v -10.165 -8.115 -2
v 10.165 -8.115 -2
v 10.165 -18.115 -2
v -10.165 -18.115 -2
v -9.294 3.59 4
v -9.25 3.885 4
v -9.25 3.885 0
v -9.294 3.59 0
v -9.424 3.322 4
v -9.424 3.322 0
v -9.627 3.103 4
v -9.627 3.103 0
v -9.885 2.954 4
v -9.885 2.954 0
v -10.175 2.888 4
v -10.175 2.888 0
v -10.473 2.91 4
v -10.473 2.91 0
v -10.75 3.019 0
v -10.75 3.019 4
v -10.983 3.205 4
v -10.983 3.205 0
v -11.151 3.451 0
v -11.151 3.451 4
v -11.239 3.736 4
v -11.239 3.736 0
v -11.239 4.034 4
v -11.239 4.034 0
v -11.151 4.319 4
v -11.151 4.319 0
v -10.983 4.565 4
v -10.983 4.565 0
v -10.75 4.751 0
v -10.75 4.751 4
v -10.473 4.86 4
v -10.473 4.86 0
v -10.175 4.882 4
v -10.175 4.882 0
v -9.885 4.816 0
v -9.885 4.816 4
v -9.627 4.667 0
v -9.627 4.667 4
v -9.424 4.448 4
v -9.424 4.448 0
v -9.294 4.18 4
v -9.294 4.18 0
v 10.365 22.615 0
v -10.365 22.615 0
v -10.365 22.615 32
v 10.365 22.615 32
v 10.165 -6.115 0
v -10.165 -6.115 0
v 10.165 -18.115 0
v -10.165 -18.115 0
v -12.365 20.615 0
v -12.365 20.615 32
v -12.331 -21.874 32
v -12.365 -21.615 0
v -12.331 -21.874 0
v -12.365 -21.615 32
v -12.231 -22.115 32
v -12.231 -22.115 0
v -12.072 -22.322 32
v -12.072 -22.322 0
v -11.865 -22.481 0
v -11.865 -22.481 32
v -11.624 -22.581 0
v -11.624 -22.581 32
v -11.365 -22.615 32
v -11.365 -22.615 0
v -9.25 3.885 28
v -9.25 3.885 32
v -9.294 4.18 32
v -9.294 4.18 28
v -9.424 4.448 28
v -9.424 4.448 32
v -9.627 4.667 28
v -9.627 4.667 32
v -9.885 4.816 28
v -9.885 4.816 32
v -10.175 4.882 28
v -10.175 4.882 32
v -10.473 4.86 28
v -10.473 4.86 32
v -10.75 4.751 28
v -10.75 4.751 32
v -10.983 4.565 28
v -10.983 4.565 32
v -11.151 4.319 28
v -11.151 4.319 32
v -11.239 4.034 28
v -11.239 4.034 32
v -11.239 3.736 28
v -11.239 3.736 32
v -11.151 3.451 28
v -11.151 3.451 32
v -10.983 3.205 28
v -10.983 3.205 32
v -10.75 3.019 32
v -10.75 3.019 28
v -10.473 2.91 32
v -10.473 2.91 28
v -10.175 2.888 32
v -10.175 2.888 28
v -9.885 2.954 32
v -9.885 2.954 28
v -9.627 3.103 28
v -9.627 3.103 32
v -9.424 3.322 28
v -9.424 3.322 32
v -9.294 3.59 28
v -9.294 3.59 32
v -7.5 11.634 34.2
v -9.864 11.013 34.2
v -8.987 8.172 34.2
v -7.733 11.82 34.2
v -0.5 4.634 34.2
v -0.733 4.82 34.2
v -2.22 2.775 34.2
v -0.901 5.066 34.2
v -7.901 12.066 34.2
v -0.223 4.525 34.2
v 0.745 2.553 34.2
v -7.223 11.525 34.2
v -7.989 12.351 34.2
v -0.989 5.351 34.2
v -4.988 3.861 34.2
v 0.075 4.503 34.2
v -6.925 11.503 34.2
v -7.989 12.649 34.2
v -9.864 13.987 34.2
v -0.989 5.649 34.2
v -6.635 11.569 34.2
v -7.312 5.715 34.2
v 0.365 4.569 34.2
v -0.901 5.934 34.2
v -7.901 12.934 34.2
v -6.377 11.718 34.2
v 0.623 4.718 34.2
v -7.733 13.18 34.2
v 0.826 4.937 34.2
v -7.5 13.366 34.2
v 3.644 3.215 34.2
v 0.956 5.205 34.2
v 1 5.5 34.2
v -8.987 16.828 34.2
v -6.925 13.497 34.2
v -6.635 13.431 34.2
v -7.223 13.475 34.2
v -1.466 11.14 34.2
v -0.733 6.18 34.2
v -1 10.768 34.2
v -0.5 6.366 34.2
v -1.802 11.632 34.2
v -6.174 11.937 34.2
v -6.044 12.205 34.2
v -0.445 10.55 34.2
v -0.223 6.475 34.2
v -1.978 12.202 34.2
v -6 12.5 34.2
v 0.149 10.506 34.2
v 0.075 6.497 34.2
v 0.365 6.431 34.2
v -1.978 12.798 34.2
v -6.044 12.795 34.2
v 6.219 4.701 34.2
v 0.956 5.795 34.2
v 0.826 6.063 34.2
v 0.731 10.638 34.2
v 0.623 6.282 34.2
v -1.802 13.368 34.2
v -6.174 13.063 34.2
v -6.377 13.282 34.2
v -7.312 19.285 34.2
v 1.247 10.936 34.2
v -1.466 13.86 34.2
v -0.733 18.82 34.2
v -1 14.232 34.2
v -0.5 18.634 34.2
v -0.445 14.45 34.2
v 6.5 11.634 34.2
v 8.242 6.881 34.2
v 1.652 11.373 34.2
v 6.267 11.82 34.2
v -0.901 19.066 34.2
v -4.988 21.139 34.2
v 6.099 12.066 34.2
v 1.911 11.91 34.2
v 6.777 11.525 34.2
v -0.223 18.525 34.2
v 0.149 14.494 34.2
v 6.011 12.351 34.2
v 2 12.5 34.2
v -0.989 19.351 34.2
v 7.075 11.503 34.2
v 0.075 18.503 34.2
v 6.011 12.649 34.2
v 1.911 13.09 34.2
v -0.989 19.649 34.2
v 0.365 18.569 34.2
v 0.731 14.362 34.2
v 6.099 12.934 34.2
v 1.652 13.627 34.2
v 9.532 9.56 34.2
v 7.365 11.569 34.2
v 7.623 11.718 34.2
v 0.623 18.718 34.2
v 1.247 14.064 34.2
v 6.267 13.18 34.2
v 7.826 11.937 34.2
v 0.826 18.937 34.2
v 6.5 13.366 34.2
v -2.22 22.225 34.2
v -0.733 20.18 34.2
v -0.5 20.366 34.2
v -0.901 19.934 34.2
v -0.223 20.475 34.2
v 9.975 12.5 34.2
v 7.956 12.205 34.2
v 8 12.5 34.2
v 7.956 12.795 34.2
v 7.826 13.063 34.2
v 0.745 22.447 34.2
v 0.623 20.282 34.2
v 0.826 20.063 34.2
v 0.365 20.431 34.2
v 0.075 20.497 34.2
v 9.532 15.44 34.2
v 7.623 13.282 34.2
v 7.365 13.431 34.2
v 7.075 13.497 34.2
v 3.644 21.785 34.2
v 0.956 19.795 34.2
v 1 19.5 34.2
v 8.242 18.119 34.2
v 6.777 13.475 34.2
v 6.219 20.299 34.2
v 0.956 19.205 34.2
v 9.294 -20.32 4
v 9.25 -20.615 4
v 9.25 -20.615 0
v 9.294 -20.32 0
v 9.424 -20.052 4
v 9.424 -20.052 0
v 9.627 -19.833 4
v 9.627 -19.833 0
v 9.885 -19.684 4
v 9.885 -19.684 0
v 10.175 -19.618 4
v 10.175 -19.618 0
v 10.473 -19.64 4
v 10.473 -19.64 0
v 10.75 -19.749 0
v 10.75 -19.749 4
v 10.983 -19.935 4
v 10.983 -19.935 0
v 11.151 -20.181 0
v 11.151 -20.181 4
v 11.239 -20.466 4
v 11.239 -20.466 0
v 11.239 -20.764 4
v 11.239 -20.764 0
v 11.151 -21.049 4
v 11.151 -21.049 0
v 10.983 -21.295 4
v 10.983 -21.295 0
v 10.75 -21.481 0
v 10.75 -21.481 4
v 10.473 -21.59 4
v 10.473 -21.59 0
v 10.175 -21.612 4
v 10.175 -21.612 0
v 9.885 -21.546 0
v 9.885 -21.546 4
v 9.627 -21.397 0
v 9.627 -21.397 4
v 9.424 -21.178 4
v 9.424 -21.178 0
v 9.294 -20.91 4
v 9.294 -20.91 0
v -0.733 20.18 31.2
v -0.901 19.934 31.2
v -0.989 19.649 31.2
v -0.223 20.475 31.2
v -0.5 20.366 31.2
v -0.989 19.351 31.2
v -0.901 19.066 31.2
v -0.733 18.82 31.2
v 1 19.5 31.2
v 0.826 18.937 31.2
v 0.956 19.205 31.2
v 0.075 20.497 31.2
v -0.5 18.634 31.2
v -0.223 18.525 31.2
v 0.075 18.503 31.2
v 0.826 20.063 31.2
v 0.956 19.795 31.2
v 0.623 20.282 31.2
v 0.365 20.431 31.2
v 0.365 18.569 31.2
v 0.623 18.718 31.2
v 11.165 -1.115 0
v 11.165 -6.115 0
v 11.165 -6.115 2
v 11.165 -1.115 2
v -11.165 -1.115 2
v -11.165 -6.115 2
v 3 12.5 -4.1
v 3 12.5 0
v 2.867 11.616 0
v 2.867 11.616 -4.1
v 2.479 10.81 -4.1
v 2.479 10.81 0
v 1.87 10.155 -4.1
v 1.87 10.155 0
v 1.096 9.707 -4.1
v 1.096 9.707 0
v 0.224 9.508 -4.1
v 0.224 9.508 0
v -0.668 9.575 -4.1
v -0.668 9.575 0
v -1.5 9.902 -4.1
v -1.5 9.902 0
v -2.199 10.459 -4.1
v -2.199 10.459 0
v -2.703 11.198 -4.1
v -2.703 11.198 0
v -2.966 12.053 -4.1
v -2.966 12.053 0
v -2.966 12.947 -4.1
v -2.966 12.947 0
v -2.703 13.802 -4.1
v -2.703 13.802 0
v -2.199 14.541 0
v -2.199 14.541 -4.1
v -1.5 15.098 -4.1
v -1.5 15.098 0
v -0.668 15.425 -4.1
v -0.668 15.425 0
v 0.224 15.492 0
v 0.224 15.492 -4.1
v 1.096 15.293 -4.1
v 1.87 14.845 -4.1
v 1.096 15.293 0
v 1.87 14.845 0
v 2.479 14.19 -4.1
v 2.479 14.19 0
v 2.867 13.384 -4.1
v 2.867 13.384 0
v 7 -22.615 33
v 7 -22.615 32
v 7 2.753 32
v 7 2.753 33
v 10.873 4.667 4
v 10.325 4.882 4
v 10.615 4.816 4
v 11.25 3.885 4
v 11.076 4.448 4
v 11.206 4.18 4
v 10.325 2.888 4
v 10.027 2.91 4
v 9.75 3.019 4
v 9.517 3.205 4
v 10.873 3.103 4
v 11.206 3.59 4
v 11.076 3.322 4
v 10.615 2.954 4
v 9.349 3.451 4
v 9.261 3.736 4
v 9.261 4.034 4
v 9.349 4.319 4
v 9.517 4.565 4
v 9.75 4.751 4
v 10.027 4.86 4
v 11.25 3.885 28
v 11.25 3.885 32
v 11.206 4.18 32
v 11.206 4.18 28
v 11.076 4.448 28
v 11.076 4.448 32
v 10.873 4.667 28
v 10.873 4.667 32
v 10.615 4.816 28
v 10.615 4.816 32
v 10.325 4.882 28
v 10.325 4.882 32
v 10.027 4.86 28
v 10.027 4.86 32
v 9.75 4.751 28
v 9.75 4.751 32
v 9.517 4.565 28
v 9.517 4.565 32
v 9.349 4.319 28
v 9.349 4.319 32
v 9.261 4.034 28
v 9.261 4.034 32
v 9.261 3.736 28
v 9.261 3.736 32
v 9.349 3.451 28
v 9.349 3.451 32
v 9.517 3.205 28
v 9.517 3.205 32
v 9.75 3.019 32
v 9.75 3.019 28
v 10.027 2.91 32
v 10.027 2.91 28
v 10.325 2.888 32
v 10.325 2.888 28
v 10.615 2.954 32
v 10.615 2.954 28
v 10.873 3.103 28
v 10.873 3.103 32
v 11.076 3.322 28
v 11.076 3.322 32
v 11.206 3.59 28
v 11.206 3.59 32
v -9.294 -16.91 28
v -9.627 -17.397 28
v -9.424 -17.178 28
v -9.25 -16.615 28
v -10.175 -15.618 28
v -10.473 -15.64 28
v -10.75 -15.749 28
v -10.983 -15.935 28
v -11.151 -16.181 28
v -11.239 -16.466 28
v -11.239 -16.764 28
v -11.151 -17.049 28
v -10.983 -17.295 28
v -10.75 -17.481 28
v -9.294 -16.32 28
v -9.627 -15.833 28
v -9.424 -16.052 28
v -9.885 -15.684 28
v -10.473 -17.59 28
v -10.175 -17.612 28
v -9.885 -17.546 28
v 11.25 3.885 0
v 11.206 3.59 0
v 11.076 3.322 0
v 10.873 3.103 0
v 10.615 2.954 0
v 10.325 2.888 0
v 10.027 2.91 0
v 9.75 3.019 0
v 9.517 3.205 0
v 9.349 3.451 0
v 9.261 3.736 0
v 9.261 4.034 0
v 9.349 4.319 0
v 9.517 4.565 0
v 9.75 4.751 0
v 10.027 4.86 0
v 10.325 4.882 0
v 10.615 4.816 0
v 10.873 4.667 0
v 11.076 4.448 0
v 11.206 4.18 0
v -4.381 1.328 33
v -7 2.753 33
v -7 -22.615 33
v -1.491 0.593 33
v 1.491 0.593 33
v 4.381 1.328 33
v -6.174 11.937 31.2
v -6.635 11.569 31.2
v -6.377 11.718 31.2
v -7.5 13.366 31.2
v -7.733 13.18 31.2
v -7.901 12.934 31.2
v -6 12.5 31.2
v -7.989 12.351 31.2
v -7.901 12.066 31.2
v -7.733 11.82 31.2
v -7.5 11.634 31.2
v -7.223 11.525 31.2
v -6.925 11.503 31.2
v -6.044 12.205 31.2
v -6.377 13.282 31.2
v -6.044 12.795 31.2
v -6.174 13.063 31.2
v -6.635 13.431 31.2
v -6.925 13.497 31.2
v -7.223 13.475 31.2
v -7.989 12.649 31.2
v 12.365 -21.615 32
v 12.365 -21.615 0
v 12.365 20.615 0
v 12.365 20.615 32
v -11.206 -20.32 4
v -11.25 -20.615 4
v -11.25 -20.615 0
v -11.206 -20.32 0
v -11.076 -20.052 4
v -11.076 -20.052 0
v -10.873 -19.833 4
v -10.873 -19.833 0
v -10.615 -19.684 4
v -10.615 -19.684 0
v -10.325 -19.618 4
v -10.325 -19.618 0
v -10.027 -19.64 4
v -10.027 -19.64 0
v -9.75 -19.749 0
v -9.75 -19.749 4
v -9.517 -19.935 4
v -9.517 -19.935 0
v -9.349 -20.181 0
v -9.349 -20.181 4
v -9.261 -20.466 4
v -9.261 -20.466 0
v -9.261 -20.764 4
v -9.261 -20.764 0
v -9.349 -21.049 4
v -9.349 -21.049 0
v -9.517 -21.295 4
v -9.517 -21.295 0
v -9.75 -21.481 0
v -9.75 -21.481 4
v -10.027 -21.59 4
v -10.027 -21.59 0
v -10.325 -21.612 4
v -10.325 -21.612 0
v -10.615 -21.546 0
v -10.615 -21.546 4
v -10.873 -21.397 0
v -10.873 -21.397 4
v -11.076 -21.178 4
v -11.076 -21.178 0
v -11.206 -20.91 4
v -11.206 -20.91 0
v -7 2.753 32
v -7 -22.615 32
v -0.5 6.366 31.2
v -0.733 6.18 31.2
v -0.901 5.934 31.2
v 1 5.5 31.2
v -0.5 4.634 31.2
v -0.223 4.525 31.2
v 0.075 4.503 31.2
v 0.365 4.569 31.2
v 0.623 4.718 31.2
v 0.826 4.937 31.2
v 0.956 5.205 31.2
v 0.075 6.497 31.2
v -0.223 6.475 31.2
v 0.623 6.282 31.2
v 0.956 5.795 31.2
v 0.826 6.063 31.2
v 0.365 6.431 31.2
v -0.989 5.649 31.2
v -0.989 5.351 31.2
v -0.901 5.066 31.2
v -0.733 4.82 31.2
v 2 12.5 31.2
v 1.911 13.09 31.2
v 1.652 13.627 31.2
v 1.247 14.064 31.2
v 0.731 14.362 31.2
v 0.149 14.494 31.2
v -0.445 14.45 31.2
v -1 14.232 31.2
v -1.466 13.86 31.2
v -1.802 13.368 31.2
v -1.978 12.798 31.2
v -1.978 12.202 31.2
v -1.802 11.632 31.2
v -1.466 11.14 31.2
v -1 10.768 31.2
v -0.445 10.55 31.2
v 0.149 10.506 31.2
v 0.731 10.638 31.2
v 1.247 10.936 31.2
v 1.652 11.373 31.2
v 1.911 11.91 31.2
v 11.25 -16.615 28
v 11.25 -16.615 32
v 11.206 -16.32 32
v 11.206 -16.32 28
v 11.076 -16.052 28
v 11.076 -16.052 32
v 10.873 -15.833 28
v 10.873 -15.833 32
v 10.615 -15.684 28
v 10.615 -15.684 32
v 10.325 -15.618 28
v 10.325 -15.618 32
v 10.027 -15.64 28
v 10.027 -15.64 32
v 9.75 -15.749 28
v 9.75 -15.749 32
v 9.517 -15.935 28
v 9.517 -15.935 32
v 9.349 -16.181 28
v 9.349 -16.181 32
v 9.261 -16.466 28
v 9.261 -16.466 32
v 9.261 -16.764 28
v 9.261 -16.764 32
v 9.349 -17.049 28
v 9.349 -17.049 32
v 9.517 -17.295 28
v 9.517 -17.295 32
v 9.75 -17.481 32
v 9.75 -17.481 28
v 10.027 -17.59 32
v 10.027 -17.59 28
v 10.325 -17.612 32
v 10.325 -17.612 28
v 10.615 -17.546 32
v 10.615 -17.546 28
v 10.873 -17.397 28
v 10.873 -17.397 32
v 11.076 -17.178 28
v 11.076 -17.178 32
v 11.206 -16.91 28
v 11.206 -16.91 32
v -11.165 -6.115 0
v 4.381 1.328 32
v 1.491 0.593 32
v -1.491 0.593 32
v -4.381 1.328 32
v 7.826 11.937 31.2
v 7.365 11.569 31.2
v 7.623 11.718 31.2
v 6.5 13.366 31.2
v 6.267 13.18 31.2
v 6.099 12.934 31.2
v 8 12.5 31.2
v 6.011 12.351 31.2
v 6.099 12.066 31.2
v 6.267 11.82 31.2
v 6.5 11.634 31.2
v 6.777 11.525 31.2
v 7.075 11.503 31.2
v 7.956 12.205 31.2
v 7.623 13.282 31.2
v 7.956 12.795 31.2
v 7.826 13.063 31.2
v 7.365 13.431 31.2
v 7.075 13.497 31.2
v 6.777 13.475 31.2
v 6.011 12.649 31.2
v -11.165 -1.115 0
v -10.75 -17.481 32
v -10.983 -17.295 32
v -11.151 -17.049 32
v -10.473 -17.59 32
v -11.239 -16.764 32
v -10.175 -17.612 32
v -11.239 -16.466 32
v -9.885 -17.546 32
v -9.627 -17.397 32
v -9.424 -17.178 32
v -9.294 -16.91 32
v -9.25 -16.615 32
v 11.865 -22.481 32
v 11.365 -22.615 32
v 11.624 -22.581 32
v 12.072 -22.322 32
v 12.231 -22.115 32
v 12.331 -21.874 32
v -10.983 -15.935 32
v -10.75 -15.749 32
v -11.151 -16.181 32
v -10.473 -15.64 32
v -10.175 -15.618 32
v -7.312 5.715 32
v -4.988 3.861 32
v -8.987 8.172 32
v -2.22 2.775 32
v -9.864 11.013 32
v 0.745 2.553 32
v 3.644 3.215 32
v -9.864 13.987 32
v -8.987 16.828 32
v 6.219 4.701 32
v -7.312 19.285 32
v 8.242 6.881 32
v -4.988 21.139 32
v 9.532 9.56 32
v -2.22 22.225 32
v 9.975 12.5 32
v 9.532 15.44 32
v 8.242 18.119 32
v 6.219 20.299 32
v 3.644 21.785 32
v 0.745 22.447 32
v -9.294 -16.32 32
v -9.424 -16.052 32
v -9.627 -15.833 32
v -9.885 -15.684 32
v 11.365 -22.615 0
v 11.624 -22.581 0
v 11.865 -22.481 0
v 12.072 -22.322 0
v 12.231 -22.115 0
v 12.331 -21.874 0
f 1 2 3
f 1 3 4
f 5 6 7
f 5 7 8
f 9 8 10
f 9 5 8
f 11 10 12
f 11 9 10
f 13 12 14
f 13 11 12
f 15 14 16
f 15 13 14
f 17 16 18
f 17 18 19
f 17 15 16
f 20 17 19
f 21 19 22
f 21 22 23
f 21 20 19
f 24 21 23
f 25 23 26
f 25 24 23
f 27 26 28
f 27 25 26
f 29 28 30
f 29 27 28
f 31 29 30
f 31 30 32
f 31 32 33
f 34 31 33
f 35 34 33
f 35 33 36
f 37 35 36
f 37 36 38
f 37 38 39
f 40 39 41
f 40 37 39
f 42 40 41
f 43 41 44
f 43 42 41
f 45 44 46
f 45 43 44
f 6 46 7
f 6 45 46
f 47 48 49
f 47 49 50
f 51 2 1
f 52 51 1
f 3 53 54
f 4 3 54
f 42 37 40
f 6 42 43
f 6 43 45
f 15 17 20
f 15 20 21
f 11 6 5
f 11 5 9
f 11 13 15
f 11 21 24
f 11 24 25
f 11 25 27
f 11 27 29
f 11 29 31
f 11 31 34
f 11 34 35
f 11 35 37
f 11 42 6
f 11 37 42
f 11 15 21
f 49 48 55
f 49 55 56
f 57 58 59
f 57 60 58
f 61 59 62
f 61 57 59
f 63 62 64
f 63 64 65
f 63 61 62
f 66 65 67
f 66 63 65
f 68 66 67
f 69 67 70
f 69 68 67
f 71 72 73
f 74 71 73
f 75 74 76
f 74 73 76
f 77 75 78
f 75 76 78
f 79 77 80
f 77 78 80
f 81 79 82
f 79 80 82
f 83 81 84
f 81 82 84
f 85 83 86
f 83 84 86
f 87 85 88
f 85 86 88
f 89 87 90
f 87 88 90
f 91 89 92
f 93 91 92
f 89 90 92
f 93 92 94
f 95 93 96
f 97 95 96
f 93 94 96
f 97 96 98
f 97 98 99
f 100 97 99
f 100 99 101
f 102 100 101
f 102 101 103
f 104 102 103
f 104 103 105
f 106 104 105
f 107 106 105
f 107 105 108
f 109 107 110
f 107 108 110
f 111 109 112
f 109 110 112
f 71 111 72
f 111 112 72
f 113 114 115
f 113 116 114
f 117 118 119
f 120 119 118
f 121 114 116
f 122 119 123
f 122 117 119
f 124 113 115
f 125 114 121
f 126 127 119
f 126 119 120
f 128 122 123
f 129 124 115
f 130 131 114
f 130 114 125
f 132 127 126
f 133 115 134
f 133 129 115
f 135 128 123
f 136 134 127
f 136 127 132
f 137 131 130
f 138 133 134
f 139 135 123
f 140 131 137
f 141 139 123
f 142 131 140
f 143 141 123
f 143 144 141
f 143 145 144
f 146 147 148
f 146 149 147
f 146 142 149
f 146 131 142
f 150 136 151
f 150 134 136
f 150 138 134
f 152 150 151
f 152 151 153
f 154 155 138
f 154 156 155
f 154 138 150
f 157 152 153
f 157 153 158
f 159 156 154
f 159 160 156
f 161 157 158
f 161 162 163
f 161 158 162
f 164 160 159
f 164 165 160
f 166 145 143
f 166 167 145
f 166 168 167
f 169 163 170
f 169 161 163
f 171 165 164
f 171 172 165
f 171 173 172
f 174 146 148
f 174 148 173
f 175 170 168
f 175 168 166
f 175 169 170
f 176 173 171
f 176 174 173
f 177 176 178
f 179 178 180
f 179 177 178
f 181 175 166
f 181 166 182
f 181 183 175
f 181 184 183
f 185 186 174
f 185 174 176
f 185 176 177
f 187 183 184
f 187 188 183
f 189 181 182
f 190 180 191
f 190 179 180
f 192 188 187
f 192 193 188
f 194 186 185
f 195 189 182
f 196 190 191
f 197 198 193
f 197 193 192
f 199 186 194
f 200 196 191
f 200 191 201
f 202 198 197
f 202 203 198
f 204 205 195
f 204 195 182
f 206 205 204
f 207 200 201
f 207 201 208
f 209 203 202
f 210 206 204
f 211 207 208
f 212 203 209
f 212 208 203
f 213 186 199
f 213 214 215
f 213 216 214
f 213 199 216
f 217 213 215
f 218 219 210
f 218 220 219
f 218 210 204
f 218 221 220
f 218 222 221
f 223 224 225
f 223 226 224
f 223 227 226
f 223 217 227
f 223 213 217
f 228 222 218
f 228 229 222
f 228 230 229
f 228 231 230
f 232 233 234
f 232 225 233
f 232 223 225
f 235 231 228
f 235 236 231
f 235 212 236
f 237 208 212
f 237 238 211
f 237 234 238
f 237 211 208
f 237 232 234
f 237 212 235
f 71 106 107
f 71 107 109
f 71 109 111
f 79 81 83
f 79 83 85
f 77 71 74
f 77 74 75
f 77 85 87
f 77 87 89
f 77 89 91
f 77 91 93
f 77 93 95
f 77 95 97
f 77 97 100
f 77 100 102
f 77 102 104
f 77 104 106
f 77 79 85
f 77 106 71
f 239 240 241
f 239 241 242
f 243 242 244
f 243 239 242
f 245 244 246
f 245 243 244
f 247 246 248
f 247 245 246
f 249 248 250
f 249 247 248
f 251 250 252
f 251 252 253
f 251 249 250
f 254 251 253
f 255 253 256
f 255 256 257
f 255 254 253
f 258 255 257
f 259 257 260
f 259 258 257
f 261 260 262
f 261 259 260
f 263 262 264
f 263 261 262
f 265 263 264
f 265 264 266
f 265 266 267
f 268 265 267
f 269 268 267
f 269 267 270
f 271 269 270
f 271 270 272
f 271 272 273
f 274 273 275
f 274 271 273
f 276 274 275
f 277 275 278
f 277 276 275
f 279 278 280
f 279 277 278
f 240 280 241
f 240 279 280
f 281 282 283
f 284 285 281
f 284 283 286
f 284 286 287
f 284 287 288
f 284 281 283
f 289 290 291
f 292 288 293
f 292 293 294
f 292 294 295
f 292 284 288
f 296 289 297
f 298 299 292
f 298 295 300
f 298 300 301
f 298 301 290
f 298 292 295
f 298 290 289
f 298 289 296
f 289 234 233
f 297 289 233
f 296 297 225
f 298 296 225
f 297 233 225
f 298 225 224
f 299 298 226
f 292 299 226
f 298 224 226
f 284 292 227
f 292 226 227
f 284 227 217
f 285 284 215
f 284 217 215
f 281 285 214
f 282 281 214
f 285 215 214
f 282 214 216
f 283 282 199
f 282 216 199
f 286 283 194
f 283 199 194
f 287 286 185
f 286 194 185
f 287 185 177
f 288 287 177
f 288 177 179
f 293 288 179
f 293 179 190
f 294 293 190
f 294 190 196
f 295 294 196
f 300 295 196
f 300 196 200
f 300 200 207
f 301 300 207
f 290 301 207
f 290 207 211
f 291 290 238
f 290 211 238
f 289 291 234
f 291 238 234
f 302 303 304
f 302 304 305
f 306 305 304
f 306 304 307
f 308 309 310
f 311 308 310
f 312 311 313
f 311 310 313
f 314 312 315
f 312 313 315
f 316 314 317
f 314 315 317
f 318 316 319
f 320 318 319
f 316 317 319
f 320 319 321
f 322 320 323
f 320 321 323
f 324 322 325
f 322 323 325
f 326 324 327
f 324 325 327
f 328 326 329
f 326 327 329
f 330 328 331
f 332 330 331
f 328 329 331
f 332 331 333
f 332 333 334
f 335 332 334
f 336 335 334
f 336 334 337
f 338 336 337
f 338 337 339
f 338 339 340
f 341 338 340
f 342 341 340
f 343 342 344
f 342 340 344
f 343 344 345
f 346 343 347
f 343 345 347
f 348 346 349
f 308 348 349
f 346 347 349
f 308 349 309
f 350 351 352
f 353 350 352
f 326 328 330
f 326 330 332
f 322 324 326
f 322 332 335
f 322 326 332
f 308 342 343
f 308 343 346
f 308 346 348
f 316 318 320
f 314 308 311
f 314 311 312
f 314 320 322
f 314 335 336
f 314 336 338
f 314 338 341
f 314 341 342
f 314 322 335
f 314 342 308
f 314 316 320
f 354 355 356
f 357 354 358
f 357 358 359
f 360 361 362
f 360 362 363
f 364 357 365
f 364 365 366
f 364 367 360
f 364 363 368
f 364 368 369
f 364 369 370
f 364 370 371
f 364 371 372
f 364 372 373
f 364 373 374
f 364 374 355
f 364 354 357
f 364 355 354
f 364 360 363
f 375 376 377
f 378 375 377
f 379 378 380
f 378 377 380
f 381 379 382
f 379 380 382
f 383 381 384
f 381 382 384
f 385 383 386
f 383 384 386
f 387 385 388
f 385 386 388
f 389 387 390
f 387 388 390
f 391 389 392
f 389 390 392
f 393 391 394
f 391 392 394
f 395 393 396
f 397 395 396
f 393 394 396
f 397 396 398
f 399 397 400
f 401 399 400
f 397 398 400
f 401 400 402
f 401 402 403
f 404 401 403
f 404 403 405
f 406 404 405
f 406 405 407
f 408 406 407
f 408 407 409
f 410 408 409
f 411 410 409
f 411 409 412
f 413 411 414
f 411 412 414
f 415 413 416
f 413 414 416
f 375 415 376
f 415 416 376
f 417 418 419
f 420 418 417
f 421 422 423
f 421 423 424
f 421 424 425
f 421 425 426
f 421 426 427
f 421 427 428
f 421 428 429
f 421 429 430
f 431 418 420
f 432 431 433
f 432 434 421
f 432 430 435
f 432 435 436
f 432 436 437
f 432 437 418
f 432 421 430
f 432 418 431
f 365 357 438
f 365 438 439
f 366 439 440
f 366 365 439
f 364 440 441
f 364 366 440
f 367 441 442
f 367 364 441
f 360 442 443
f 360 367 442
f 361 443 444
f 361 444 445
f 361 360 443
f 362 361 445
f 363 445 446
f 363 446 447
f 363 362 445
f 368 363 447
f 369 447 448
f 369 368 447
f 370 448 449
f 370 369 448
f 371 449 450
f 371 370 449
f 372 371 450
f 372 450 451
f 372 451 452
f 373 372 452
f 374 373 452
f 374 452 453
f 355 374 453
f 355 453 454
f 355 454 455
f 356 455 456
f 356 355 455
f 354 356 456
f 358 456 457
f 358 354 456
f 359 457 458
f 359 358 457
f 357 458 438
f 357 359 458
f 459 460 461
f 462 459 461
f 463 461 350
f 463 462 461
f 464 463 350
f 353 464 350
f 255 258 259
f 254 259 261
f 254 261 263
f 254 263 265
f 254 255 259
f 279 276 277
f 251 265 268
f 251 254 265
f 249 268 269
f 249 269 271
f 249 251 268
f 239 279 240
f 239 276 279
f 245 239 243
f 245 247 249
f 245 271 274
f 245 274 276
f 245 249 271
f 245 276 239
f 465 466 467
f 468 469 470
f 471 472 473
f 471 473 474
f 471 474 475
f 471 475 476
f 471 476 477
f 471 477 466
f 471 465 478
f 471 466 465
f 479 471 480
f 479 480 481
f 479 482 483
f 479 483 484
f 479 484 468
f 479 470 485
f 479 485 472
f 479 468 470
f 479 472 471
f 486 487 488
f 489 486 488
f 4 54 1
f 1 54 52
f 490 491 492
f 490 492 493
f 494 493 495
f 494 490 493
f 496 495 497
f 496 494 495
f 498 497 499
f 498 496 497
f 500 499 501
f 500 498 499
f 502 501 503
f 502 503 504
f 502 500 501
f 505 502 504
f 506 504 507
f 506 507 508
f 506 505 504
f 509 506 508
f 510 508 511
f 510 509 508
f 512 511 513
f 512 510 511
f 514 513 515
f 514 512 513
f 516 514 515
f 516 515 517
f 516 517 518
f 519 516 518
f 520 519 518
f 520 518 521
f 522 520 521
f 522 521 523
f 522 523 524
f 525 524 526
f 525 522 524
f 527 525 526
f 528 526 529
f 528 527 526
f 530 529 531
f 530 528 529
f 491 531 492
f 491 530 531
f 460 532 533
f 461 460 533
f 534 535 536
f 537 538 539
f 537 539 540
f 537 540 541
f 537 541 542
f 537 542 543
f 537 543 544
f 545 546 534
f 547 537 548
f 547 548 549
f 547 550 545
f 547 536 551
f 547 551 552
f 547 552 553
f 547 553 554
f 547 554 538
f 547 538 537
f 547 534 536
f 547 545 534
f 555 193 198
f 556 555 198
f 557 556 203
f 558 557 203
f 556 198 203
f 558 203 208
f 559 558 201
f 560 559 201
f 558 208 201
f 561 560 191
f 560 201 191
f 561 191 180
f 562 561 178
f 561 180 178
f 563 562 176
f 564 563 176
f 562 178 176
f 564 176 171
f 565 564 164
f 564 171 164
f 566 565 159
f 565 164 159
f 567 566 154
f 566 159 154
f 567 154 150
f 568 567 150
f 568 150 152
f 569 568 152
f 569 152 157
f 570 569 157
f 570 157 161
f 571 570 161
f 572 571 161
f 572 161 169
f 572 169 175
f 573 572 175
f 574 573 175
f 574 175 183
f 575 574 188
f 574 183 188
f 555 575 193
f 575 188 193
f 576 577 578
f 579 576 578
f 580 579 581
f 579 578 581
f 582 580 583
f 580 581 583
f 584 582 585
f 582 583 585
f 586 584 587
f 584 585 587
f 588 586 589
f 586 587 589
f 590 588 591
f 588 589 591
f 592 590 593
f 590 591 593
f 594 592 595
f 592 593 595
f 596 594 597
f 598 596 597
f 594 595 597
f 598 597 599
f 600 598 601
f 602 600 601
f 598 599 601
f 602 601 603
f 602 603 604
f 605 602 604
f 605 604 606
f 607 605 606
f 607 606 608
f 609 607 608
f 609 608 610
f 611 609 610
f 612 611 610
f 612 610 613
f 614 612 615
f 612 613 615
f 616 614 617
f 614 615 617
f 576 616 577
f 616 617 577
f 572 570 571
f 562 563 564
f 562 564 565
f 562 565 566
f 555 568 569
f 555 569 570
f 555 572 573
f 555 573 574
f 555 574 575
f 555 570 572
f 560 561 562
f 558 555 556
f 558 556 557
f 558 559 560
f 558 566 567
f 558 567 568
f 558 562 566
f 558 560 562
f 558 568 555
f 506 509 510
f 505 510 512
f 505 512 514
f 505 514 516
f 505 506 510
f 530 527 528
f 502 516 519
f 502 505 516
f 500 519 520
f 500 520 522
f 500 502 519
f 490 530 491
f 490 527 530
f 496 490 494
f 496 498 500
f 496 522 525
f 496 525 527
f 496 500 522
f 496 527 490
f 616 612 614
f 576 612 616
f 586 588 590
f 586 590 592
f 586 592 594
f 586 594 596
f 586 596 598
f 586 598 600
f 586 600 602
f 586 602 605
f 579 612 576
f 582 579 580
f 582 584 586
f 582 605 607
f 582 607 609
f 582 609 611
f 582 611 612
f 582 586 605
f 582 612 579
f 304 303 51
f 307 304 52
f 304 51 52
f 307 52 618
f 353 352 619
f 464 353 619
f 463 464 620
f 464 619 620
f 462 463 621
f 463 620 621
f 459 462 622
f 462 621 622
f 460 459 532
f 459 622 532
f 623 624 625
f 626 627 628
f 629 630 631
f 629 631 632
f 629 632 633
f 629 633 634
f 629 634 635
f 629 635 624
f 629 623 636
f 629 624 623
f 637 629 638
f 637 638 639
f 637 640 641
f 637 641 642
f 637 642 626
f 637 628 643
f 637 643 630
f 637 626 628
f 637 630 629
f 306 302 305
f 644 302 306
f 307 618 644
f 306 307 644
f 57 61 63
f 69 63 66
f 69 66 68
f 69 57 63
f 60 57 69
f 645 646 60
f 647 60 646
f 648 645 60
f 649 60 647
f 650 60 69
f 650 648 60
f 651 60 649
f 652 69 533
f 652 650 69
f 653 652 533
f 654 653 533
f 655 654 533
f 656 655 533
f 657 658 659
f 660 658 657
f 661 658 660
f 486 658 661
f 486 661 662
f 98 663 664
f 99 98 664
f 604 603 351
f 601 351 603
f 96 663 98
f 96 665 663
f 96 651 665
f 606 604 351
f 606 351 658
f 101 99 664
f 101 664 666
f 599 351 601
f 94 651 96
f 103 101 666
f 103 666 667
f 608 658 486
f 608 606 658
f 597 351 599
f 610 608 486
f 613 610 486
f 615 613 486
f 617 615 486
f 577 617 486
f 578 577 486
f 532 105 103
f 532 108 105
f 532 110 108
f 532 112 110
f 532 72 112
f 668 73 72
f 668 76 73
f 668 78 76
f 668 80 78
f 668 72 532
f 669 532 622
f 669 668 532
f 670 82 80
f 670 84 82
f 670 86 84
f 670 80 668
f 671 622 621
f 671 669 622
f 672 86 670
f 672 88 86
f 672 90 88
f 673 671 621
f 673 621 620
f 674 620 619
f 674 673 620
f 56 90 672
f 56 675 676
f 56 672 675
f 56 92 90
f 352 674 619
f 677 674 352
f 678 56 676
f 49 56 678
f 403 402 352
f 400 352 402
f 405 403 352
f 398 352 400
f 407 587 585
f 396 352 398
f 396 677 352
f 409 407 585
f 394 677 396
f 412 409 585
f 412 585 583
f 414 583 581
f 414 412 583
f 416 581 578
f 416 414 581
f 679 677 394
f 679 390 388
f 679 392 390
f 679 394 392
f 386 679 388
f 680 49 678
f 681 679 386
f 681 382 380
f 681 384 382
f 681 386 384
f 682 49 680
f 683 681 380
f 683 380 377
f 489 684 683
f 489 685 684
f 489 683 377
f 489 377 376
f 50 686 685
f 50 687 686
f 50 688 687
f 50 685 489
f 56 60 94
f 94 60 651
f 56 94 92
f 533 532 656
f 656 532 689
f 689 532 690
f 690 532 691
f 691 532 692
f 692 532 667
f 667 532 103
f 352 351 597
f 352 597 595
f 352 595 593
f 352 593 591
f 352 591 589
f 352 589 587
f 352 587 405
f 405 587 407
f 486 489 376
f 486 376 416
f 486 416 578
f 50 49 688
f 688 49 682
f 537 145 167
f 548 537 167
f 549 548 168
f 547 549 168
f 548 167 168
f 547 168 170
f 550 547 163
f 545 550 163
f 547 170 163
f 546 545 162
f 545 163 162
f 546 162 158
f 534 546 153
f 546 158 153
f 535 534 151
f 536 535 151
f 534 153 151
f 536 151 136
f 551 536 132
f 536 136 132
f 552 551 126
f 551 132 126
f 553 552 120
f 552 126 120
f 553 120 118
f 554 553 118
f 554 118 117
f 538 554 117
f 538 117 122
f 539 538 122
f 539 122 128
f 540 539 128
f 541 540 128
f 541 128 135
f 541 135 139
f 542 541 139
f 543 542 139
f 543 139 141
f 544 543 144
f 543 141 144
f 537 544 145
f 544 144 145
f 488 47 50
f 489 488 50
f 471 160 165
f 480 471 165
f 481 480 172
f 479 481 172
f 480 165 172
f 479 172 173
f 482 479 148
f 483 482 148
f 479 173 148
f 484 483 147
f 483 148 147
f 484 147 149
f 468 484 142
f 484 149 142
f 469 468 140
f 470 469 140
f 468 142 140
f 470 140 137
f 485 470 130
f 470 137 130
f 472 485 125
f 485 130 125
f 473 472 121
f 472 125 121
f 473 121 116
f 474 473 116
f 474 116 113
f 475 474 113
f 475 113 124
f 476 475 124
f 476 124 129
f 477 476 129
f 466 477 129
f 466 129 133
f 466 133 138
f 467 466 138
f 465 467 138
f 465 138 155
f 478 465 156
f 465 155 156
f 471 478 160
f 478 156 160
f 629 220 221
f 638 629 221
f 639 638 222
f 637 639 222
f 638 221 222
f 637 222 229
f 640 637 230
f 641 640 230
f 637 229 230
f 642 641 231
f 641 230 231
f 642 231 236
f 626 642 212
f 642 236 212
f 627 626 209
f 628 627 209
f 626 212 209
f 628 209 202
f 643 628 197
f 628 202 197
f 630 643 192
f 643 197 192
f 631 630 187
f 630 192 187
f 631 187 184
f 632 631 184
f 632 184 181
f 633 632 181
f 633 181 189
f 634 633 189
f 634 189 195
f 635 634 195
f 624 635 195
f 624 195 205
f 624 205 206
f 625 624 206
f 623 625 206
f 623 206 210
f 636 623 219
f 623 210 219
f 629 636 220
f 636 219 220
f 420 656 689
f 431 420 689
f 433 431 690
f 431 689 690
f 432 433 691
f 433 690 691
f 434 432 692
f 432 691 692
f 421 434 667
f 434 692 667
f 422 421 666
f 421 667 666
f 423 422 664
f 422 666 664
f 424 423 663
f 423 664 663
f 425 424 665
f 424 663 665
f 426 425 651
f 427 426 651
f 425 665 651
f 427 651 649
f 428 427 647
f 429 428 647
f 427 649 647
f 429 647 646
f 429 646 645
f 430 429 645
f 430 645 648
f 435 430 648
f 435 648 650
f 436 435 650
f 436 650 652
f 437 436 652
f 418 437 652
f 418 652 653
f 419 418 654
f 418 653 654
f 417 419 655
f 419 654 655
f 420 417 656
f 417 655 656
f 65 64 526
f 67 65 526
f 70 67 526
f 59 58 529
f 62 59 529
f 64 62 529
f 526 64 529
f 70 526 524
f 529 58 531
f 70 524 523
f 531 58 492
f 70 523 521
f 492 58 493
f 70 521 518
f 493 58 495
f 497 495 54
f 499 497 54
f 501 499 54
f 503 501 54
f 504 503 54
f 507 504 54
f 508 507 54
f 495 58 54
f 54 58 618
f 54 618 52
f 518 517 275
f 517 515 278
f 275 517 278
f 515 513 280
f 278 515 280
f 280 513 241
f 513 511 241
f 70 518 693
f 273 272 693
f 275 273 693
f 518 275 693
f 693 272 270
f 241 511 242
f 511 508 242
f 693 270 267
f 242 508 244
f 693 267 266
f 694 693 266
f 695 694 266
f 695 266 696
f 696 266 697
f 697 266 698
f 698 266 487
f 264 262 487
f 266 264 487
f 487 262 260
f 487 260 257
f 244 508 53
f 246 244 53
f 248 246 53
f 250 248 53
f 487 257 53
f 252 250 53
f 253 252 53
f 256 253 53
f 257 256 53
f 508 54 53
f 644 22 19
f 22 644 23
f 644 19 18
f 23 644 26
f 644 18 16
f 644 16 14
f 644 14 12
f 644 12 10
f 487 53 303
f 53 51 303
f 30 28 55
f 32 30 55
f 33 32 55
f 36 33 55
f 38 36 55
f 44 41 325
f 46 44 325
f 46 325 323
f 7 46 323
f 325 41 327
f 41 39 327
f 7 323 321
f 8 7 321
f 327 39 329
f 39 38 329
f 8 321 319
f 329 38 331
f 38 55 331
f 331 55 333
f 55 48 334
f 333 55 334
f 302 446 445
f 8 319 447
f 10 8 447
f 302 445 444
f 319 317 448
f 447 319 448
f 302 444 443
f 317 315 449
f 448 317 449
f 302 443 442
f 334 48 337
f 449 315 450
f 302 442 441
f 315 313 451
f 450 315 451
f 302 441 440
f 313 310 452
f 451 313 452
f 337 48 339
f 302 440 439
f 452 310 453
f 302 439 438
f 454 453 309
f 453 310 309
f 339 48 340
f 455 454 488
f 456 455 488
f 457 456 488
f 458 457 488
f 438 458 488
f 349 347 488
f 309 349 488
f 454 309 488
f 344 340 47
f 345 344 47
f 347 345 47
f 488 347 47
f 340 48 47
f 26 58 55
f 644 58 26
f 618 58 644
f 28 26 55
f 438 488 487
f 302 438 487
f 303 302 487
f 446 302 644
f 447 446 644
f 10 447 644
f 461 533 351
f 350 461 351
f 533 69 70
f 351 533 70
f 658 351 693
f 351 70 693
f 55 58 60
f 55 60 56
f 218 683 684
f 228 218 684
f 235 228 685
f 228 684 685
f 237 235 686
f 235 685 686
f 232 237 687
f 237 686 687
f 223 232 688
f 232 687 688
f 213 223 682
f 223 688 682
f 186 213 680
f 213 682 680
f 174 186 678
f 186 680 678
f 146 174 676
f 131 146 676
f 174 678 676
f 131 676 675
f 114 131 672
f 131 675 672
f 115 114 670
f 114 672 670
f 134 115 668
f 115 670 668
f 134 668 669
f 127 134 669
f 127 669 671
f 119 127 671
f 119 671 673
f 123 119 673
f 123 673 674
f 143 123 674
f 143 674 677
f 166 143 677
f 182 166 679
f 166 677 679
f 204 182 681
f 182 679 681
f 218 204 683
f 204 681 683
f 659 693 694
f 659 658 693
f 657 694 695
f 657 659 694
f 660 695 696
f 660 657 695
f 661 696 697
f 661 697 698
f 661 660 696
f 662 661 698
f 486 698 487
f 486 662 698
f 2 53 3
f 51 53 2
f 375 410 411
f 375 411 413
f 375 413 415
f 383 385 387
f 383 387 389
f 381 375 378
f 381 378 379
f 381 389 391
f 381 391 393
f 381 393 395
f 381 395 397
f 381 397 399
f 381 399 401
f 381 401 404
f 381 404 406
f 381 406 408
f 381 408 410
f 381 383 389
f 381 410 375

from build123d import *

# Parameters (mm, degrees)
SKETCH_1_W          = 24.73
SKETCH_1_H          = 45.23
EXTRUDE_1_DEPTH     = 32
CHAMFER_1_SIZE      = 2
EXTRUDE_2_DEPTH     = 1
SKETCH_3_R          = 1
CUT_EXTRUDE_1_DEPTH = 4
SKETCH_4_R          = 9.975
EXTRUDE_3_DEPTH     = 2.2
SKETCH_5_R          = 2
SKETCH_5_R_2        = 1
CUT_EXTRUDE_2_DEPTH = 3
SKETCH_6_W          = 20.33
SKETCH_6_H          = 12
EXTRUDE_4_DEPTH     = 2
CHAMFER_2_SIZE      = 2
SKETCH_7_W          = 22.33
SKETCH_7_H          = 5
CUT_EXTRUDE_3_DEPTH = 2
SKETCH_8_R          = 3
EXTRUDE_5_DEPTH     = 4.1
CUT_EXTRUDE_START   = -4
SKETCH_9_R          = 1
CUT_EXTRUDE_4_DEPTH = 4
FILLET_1_R          = 1


with BuildPart() as part:
    # 스케치1 → 보스-돌출1 (new body)
    with BuildSketch(Plane.XY):
        Rectangle(SKETCH_1_W, SKETCH_1_H)
    extrude(amount=EXTRUDE_1_DEPTH)

    # 모따기1
    chamfer_1_edges = [part.edges().sort_by_distance(p)[0] for p in [
        (-12.365, 22.615, 16),
        (12.365, 22.615, 16),
    ]]
    chamfer(chamfer_1_edges, length=CHAMFER_1_SIZE)

    # 스케치2 → 보스-돌출2 (add)
    with BuildSketch(Plane.XY.offset(32)):
        with BuildLine():
            Line((-7, -22.615), (7, -22.615))
            Line((7, -22.615), (7, 2.753205655))
            ThreePointArc((7, 2.753205655), (0, 0.5), (-7, 2.753205655))
            Line((-7, 2.753205655), (-7, -22.615))
        make_face()
    extrude(amount=EXTRUDE_2_DEPTH)

    # 스케치3 → 컷-돌출1 (cut)
    with BuildSketch(Plane.XY.offset(32)):
        with Locations((-10.25, 3.885)):
            Circle(SKETCH_3_R)
        with Locations((-10.25, -16.615)):
            Circle(SKETCH_3_R)
        with Locations((10.25, -16.615)):
            Circle(SKETCH_3_R)
        with Locations((10.25, 3.885)):
            Circle(SKETCH_3_R)
    extrude(amount=-CUT_EXTRUDE_1_DEPTH, mode=Mode.SUBTRACT)

    # 스케치4 → 보스-돌출3 (add)
    with BuildSketch(Plane.XY.offset(32)):
        with Locations((0, 12.5)):
            Circle(SKETCH_4_R)
    extrude(amount=EXTRUDE_3_DEPTH)

    # 스케치5 → 컷-돌출2 (cut)
    with BuildSketch(Plane.XY.offset(34.2)):
        with Locations((0, 12.5)):
            Circle(SKETCH_5_R)
        with Locations((0, 19.5)):
            Circle(SKETCH_5_R_2)
        with Locations((7, 12.5)):
            Circle(SKETCH_5_R_2)
        with Locations((0, 5.5)):
            Circle(SKETCH_5_R_2)
        with Locations((-7, 12.5)):
            Circle(SKETCH_5_R_2)
    extrude(amount=-CUT_EXTRUDE_2_DEPTH, mode=Mode.SUBTRACT)

    # 스케치6 → 보스-돌출4 (add)
    with BuildSketch(Plane(origin=(0, 0, 0), x_dir=(-1, 0, 0), z_dir=(0, 0, -1))):
        with Locations((0, -12.115)):
            Rectangle(SKETCH_6_W, SKETCH_6_H)
    extrude(amount=EXTRUDE_4_DEPTH)

    # 모따기2
    chamfer_2_edges = [part.edges().sort_by_distance(p)[0] for p in [
        (0, -6.115, -2),
    ]]
    chamfer(chamfer_2_edges, length=CHAMFER_2_SIZE - 0.0001)  # a hair under: the kernel refuses the full size

    # 스케치7 → 컷-돌출3 (cut)
    with BuildSketch(Plane(origin=(0, 0, 0), x_dir=(-1, 0, 0), z_dir=(0, 0, -1))):
        with Locations((0, -3.615)):
            Rectangle(SKETCH_7_W, SKETCH_7_H)
    extrude(amount=-CUT_EXTRUDE_3_DEPTH, mode=Mode.SUBTRACT)

    # 스케치8 → 보스-돌출5 (add)
    with BuildSketch(Plane(origin=(0, 0, 0), x_dir=(-1, 0, 0), z_dir=(0, 0, -1))):
        with Locations(Location((0, 12.5, 0), (0, 0, 180))):
            Circle(SKETCH_8_R)
    extrude(amount=EXTRUDE_5_DEPTH)

    # 스케치9 → 컷-돌출4 (cut)
    with BuildSketch(Plane(origin=(0, 0, 0), x_dir=(-1, 0, 0), z_dir=(0, 0, -1)).offset(CUT_EXTRUDE_START)):
        with Locations(Location((-10.25, 3.885, 0), (0, 0, 180))):
            Circle(SKETCH_9_R)
        with Locations(Location((10.25, 3.885, 0), (0, 0, 180))):
            Circle(SKETCH_9_R)
        with Locations((-10.25, -20.615)):
            Circle(SKETCH_9_R)
        with Locations((10.25, -20.615)):
            Circle(SKETCH_9_R)
    extrude(amount=CUT_EXTRUDE_4_DEPTH, mode=Mode.SUBTRACT)

    # 필렛1
    fillet_1_edges = [part.edges().sort_by_distance(p)[0] for p in [
        (12.365, -22.615, 16),
        (-12.365, -22.615, 16),
    ]]
    fillet(fillet_1_edges, radius=FILLET_1_R)


solid = part.part
